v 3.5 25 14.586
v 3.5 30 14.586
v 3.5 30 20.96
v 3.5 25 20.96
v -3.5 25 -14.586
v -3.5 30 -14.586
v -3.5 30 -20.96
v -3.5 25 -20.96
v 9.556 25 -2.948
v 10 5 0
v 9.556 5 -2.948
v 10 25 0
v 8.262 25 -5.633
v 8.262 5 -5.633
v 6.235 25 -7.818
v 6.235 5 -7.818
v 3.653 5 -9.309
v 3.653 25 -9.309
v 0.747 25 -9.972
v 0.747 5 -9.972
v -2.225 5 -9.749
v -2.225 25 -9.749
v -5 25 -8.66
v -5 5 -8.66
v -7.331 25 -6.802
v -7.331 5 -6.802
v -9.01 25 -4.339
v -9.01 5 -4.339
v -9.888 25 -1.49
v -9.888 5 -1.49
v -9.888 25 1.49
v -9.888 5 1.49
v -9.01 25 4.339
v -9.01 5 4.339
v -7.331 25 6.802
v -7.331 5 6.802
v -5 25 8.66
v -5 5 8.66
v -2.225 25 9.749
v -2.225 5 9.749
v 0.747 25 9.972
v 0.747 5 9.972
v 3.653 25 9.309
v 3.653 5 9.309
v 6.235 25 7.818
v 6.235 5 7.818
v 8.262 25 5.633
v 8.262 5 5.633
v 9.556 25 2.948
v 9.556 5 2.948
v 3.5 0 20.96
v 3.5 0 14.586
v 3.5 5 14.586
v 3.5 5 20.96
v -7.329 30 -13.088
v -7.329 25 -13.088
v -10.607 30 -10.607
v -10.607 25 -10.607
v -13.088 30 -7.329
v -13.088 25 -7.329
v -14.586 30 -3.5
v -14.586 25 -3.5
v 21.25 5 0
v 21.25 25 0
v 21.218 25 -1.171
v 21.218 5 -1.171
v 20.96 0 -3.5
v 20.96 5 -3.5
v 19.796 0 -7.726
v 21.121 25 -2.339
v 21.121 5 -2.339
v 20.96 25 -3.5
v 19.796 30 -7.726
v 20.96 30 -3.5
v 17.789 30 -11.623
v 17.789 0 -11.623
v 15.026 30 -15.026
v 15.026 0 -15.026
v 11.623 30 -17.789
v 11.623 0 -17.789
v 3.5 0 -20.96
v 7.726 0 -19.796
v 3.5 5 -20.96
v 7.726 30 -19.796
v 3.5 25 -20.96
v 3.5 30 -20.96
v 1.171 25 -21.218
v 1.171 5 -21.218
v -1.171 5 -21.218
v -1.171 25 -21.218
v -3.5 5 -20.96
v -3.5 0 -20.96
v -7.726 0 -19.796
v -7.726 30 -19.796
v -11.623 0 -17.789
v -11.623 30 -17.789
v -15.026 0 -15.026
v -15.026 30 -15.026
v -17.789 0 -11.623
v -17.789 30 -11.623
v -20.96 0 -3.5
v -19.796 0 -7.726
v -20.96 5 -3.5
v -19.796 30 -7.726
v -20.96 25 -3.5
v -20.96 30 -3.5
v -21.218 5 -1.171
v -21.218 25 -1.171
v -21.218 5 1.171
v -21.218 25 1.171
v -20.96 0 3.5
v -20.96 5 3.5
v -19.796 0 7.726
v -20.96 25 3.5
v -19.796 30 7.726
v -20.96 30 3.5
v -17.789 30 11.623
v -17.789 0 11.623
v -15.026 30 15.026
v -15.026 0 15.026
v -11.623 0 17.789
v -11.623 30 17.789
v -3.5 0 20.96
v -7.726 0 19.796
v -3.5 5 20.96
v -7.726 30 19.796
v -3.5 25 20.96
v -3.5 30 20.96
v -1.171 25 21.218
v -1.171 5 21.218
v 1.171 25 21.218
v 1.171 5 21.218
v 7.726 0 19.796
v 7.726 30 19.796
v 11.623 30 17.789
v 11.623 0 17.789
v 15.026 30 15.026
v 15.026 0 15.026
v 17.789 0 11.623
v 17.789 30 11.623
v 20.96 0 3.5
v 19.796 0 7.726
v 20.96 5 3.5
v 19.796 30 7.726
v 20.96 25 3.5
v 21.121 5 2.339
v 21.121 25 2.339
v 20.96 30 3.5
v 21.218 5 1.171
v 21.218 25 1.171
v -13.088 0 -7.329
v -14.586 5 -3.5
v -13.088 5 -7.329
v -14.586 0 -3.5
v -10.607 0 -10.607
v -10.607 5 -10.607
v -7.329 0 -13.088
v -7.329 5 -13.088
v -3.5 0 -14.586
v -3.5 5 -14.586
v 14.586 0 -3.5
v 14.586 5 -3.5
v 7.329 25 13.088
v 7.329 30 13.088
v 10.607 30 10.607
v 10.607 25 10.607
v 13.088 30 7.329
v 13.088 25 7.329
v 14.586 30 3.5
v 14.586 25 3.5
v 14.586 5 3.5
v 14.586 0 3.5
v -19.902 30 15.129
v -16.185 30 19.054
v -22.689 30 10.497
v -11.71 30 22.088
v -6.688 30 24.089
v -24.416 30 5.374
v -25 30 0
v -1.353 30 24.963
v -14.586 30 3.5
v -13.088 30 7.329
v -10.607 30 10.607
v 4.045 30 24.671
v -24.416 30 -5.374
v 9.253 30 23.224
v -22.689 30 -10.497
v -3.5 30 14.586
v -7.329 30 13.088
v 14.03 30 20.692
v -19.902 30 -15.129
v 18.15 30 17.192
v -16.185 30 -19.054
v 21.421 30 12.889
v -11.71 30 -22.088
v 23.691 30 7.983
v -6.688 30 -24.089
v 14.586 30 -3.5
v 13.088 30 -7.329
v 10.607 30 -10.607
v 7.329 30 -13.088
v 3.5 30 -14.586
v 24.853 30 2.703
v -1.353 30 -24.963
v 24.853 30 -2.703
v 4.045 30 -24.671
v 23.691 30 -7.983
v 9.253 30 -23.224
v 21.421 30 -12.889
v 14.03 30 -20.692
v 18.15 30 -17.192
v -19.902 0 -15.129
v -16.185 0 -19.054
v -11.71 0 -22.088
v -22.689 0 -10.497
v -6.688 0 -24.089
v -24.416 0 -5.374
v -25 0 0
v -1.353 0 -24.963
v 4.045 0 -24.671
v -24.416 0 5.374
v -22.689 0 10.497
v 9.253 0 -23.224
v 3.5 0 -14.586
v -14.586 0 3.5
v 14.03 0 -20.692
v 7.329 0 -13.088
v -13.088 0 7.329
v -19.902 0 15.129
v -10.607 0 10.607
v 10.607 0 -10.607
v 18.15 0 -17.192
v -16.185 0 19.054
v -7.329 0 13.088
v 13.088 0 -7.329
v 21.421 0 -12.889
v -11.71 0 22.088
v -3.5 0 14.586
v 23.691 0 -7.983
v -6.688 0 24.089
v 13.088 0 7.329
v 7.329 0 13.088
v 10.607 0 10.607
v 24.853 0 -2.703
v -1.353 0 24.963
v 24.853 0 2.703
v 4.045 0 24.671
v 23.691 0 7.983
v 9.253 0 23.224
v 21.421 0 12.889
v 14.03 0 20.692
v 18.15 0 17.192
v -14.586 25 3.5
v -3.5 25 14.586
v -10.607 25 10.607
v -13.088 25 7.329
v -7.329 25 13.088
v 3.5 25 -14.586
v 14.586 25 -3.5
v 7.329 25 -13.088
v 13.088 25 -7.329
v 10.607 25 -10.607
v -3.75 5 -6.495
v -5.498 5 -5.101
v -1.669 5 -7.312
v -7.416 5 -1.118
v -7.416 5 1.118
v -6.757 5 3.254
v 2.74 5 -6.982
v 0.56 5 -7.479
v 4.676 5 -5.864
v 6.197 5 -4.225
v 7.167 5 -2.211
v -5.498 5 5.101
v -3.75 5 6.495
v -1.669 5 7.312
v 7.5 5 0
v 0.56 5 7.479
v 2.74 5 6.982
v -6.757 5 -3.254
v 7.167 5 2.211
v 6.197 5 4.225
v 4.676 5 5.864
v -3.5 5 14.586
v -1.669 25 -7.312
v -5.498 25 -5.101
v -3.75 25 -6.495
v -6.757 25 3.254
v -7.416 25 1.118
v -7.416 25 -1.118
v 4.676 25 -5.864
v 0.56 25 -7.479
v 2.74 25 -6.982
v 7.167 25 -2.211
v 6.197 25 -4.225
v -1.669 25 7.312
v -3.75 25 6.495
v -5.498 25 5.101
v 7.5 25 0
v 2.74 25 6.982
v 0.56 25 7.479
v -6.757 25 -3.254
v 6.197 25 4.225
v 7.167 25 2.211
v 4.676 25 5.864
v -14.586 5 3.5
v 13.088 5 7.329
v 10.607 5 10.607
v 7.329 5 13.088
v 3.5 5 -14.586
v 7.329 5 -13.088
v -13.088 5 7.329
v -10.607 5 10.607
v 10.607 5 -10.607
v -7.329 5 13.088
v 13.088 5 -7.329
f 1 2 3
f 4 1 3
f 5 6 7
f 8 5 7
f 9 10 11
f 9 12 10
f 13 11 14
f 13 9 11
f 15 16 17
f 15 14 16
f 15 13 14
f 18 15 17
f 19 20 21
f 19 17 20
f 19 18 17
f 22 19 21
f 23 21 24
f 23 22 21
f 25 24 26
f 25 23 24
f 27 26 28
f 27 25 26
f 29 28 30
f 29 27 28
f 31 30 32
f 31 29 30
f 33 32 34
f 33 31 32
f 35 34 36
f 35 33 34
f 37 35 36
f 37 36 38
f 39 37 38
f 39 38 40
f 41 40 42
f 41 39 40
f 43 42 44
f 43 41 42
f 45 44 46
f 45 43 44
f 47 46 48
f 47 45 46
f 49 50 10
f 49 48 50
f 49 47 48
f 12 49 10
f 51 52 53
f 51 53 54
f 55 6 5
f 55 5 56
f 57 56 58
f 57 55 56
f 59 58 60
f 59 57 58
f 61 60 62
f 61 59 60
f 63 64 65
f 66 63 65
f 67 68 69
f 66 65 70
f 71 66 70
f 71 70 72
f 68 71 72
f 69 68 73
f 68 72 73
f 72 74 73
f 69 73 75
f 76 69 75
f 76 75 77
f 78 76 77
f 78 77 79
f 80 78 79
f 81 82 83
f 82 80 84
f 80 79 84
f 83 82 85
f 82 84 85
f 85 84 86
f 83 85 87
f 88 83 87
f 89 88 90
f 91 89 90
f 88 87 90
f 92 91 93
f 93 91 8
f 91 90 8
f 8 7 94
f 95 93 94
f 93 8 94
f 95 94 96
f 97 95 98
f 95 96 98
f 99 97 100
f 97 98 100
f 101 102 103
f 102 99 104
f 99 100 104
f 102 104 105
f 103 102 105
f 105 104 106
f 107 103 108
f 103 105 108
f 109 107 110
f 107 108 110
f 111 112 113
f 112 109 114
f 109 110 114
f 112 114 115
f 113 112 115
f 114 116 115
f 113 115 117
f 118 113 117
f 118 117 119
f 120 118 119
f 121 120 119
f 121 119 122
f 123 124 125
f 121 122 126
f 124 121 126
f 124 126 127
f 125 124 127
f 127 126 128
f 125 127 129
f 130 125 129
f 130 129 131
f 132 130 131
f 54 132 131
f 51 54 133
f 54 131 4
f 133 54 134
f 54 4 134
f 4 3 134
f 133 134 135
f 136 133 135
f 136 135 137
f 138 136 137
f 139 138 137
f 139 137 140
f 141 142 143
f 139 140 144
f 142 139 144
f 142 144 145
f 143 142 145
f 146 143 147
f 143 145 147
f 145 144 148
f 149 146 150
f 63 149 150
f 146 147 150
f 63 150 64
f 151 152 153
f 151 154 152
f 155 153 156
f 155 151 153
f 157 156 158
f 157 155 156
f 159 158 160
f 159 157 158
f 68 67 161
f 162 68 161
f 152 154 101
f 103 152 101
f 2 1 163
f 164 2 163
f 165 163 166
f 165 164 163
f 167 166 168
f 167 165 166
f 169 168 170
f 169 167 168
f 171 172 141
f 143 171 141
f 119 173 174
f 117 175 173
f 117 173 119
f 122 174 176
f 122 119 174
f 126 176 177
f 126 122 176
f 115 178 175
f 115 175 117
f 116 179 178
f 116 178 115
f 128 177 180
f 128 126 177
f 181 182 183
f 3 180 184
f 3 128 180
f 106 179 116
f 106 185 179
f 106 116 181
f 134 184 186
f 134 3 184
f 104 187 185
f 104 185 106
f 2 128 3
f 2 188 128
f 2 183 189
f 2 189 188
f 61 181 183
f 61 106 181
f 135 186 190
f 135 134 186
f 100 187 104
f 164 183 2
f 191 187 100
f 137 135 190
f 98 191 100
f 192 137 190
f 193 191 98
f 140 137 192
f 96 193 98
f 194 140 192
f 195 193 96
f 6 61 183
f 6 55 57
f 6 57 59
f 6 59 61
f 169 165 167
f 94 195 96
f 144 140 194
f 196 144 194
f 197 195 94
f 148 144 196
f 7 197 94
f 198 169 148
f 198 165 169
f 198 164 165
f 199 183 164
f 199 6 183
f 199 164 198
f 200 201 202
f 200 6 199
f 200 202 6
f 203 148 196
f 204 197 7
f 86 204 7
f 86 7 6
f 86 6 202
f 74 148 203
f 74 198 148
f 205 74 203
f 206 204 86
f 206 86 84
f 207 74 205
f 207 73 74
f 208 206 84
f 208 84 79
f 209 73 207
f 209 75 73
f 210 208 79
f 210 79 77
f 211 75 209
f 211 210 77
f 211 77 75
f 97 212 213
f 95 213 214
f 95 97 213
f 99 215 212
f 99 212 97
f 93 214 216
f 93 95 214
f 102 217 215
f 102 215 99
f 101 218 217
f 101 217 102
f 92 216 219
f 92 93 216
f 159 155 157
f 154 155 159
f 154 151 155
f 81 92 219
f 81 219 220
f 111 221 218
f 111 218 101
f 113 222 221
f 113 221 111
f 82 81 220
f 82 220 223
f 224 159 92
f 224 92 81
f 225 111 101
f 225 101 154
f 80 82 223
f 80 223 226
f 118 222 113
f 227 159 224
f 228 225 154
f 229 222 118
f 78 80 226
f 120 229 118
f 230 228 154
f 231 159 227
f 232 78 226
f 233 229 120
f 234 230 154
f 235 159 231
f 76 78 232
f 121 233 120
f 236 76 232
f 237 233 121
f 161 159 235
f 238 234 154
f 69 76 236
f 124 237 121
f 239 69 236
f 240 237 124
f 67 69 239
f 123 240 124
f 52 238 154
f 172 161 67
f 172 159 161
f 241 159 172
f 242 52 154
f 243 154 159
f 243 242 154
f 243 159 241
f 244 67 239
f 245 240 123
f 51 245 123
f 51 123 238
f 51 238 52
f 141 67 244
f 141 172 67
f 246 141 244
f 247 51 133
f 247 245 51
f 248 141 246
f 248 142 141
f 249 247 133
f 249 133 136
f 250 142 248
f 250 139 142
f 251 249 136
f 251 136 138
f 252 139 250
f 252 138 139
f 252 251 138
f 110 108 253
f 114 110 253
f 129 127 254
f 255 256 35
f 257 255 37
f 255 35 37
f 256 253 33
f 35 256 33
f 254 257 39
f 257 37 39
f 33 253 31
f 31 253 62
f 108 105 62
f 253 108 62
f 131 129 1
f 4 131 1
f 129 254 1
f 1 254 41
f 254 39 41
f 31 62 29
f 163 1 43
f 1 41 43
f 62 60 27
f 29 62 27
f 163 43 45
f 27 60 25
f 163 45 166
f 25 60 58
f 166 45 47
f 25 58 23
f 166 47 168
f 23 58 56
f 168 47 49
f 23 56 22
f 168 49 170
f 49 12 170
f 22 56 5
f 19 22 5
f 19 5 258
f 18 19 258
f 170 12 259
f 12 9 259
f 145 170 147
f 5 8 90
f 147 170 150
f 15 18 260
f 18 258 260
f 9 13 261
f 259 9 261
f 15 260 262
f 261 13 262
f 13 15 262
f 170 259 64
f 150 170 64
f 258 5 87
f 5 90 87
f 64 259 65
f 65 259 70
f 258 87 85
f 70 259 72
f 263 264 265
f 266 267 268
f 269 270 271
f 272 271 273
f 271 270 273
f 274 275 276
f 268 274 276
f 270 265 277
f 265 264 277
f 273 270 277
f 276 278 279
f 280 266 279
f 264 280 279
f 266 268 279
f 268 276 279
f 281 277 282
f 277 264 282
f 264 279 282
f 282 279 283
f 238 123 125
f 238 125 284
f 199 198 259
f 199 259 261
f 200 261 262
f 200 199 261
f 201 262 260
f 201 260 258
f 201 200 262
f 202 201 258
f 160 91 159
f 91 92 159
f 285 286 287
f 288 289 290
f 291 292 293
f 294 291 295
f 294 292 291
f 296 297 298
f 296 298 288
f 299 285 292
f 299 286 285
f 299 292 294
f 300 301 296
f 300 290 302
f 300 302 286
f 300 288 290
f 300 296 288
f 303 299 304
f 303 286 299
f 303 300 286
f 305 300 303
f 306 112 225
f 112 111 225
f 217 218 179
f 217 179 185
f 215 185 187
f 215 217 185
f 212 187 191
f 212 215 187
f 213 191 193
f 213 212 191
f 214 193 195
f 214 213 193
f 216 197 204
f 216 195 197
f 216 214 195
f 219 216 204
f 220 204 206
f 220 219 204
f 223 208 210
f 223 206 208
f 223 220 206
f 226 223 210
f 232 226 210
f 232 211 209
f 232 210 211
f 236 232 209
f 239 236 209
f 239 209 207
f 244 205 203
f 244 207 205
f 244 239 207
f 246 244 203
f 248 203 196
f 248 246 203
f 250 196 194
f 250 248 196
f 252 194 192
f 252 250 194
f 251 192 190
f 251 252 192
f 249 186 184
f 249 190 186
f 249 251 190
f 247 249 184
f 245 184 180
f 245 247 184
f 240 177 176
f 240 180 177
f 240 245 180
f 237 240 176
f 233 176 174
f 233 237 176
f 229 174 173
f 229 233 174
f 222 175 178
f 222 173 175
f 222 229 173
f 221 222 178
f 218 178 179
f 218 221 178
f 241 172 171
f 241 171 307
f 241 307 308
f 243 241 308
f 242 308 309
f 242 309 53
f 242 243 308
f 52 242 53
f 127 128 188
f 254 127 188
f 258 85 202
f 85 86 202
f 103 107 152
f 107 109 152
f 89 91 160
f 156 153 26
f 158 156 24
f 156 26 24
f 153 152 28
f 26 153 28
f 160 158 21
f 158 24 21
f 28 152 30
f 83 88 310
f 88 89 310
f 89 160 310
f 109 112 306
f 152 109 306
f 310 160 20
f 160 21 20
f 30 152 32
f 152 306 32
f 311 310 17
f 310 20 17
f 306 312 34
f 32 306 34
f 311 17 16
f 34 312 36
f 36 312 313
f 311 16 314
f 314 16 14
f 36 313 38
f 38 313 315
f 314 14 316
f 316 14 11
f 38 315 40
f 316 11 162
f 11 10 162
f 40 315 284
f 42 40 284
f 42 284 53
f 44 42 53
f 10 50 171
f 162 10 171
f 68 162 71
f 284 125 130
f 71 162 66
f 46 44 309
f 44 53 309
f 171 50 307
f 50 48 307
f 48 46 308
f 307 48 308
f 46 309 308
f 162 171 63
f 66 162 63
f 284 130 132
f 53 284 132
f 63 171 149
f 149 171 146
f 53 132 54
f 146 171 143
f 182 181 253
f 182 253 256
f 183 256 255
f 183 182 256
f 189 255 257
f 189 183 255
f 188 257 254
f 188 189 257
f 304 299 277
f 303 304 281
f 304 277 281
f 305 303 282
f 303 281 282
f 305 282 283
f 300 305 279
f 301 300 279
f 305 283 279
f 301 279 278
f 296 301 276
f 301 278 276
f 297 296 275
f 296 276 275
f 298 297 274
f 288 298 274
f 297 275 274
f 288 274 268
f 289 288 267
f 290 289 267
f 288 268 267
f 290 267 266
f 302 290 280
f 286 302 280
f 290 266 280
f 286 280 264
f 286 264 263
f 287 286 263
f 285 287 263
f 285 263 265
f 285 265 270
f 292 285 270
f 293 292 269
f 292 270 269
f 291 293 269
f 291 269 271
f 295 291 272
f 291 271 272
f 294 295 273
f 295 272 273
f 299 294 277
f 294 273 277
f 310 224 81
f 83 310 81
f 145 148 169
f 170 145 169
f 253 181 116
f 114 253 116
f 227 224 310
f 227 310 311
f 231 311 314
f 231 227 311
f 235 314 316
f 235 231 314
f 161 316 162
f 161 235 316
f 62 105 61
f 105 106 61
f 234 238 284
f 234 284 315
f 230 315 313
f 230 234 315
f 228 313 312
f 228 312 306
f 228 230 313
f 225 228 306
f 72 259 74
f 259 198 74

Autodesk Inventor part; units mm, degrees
ref_plane "YZ Plane" through (0, 0, 0) normal (1, 0, 0) x (0, 1, 0)
ref_plane "XZ Plane" through (0, 0, 0) normal (0, 1, 0) x (-1, 0, 0)
ref_plane "XY Plane" through (0, 0, 0) normal (0, 0, 1) x (1, 0, 0)
sketch "Sketch1" plane through (0, 0, 0) normal (0, 1, 0) x (-1, 0, 0)
  circle A0 centre (0, 0) radius 25
  dimension "d0" = 50
extrude "Extrusion1" add sketch "Sketch1" along normal blind 30
sketch "Sketch2" plane through (0, 30, 0) normal (0, 1, 0) x (1, 0, 0)
  circle A0 centre (0, 0) radius 21.25
  dimension "d3" = 42.5
extrude "Extrusion2" cut sketch "Sketch2" against normal blind 30
sketch "Sketch3" plane through (0, 30, 0) normal (0, 1, 0) x (1, 0, 0)
  circle A0 centre (0, 0) radius 15
  dimension "d6" = 30
extrude "Extrusion3" add sketch "Sketch3" against normal blind 5
sketch "Sketch4" plane through (0, 30, 0) normal (0, 1, 0) x (1, 0, 0)
  circle A0 centre (0, 0) radius 21.25 projected
  line L0 (0, -12.25) -> (3.5, -12.25)
  line L1 (3.5, -12.25) -> (3.5, -22.5574)
  line L2 (3.5, -22.5574) -> (-3.5, -22.5574)
  line L3 (-3.5, -22.5574) -> (-3.5, -12.25)
  line L4 (-3.5, -12.25) -> (0, -12.25)
  point P0 (-3.5, -20.9598)
  point P1 (3.5, -20.9598)
  dimension "d10" = 3.5
  dimension "d11" = 7
extrude "Extrusion4" add sketch "Sketch4" against normal blind 5 contours L3 L4 L0 L1 A0 picked at (1.5571, -15.2392)
sketch "Sketch5" plane through (0, 30, 0) normal (0, 1, 0) x (1, 0, 0)
  circle A0 centre (0, 0) radius 21.25 projected
  line L0 (12.1299, 0) -> (12.1299, 3.5)
  line L1 (12.1299, 3.5) -> (23.3023, 3.5)
  line L2 (23.3023, 3.5) -> (23.3023, -3.5)
  line L3 (23.3023, -3.5) -> (12.1299, -3.5)
  line L4 (12.1299, -3.5) -> (12.1299, 3.5)
  point P0 (20.9598, -3.5)
  point P1 (20.9598, 3.5)
  dimension "d16" = 3.5
  dimension "d17" = 7
extrude "Extrusion5" add sketch "Sketch5" against normal blind 5 contours A0 L3 L4 L0 L1 picked at (15.1269, -1.9464)
sketch "Sketch6" plane through (0, 30, 0) normal (0, 1, 0) x (1, 0, 0)
  line L0 (0, 13.5132) -> (-3.5, 13.5132)
  line L1 (-3.5, 13.5132) -> (-3.5, 23.3023)
  line L2 (-3.5, 23.3023) -> (3.5, 23.3023)
  line L3 (3.5, 23.3023) -> (3.5, 13.5132)
  line L4 (3.5, 13.5132) -> (-3.5, 13.5132)
  point P0 (0, 0)
  dimension "d20" = 7
extrude "Extrusion6" add sketch "Sketch6" against normal blind 5
sketch "Sketch7" plane through (0, 30, 0) normal (0, 1, 0) x (1, 0, 0)
  line L0 (-12.9812, 0) -> (-12.9812, -3.5)
  line L1 (-12.9812, -3.5) -> (-22.5574, -3.5)
  line L2 (-22.5574, -3.5) -> (-22.5574, 3.5)
  line L3 (-22.5574, 3.5) -> (-12.9812, 3.5)
  line L4 (-12.9812, 3.5) -> (-12.9812, 0)
  point P0 (0, 0)
  dimension "d23" = 3.5
  dimension "d24" = 7
extrude "Extrusion7" add sketch "Sketch7" against normal blind 5
sketch "Sketch8" plane through (0, 25, 0) normal (0, -1, 0) x (1, 0, 0)
  circle A0 centre (0, 0) radius 10
  dimension "d27" = 20
extrude "Extrusion8" add sketch "Sketch8" along normal blind 20
sketch "Sketch9" plane through (0, 5, 0) normal (0, -1, 0) x (1, 0, 0)
  circle A0 centre (0, 0) radius 7.5
  dimension "d30" = 15
extrude "Extrusion9" cut sketch "Sketch9" against normal blind 20
sketch "Sketch10" plane through (0, 0, 0) normal (0, -1, 0) x (1, 0, 0)
  circle A0 centre (0, 0) radius 15
extrude "Extrusion10" add sketch "Sketch10" against normal blind 5
sketch "Sketch11" plane through (0, 0, 0) normal (0, -1, 0) x (1, 0, 0)
  line L0 (12.662, 0) -> (12.662, 3.5)
  line L1 (12.662, 3.5) -> (22.2382, 3.5)
  line L2 (22.2382, 3.5) -> (22.2382, -3.5)
  line L3 (22.2382, -3.5) -> (12.662, -3.5)
  line L4 (12.662, -3.5) -> (12.662, 0)
  point P0 (0, 0)
  dimension "d35" = 3.5
  dimension "d36" = 7
extrude "Extrusion11" add sketch "Sketch11" against normal blind 5
sketch "Sketch12" plane through (0, 0, 0) normal (0, -1, 0) x (1, 0, 0)
  line L0 (0, 12.3428) -> (3.5, 12.3428)
  line L1 (3.5, 12.3428) -> (3.5, 22.5574)
  line L2 (3.5, 22.5574) -> (-3.5, 22.5574)
  line L3 (-3.5, 22.5574) -> (-3.5, 12.3428)
  line L4 (-3.5, 12.3428) -> (0, 12.3428)
  point P0 (0, 0)
  dimension "d39" = 3.5
  dimension "d40" = 7
extrude "Extrusion12" add sketch "Sketch12" against normal blind 5
sketch "Sketch13" plane through (0, 0, 0) normal (0, -1, 0) x (1, 0, 0)
  line L0 (0, -13.726) -> (3.5, -13.726)
  line L1 (3.5, -13.726) -> (3.5, -22.5574)
  line L2 (3.5, -22.5574) -> (-3.5, -22.5574)
  line L3 (-3.5, -22.5574) -> (-3.5, -13.726)
  line L4 (-3.5, -13.726) -> (0, -13.726)
  point P0 (0, 0)
  dimension "d43" = 3.5
  dimension "d44" = 7
extrude "Extrusion13" add sketch "Sketch13" against normal blind 5
sketch "Sketch14" plane through (0, 0, 0) normal (0, -1, 0) x (1, 0, 0)
  line L0 (-12.0235, 0) -> (-12.0235, -3.5)
  line L1 (-12.0235, -3.5) -> (-22.451, -3.5)
  line L2 (-22.451, -3.5) -> (-22.451, 3.5)
  line L3 (-22.451, 3.5) -> (-12.0235, 3.5)
  line L4 (-12.0235, 3.5) -> (-12.0235, 0)
  point P0 (0, 0)
  dimension "d47" = 3.5
  dimension "d48" = 7
extrude "Extrusion14" add sketch "Sketch14" against normal blind 5
properties part number "Wheel"
